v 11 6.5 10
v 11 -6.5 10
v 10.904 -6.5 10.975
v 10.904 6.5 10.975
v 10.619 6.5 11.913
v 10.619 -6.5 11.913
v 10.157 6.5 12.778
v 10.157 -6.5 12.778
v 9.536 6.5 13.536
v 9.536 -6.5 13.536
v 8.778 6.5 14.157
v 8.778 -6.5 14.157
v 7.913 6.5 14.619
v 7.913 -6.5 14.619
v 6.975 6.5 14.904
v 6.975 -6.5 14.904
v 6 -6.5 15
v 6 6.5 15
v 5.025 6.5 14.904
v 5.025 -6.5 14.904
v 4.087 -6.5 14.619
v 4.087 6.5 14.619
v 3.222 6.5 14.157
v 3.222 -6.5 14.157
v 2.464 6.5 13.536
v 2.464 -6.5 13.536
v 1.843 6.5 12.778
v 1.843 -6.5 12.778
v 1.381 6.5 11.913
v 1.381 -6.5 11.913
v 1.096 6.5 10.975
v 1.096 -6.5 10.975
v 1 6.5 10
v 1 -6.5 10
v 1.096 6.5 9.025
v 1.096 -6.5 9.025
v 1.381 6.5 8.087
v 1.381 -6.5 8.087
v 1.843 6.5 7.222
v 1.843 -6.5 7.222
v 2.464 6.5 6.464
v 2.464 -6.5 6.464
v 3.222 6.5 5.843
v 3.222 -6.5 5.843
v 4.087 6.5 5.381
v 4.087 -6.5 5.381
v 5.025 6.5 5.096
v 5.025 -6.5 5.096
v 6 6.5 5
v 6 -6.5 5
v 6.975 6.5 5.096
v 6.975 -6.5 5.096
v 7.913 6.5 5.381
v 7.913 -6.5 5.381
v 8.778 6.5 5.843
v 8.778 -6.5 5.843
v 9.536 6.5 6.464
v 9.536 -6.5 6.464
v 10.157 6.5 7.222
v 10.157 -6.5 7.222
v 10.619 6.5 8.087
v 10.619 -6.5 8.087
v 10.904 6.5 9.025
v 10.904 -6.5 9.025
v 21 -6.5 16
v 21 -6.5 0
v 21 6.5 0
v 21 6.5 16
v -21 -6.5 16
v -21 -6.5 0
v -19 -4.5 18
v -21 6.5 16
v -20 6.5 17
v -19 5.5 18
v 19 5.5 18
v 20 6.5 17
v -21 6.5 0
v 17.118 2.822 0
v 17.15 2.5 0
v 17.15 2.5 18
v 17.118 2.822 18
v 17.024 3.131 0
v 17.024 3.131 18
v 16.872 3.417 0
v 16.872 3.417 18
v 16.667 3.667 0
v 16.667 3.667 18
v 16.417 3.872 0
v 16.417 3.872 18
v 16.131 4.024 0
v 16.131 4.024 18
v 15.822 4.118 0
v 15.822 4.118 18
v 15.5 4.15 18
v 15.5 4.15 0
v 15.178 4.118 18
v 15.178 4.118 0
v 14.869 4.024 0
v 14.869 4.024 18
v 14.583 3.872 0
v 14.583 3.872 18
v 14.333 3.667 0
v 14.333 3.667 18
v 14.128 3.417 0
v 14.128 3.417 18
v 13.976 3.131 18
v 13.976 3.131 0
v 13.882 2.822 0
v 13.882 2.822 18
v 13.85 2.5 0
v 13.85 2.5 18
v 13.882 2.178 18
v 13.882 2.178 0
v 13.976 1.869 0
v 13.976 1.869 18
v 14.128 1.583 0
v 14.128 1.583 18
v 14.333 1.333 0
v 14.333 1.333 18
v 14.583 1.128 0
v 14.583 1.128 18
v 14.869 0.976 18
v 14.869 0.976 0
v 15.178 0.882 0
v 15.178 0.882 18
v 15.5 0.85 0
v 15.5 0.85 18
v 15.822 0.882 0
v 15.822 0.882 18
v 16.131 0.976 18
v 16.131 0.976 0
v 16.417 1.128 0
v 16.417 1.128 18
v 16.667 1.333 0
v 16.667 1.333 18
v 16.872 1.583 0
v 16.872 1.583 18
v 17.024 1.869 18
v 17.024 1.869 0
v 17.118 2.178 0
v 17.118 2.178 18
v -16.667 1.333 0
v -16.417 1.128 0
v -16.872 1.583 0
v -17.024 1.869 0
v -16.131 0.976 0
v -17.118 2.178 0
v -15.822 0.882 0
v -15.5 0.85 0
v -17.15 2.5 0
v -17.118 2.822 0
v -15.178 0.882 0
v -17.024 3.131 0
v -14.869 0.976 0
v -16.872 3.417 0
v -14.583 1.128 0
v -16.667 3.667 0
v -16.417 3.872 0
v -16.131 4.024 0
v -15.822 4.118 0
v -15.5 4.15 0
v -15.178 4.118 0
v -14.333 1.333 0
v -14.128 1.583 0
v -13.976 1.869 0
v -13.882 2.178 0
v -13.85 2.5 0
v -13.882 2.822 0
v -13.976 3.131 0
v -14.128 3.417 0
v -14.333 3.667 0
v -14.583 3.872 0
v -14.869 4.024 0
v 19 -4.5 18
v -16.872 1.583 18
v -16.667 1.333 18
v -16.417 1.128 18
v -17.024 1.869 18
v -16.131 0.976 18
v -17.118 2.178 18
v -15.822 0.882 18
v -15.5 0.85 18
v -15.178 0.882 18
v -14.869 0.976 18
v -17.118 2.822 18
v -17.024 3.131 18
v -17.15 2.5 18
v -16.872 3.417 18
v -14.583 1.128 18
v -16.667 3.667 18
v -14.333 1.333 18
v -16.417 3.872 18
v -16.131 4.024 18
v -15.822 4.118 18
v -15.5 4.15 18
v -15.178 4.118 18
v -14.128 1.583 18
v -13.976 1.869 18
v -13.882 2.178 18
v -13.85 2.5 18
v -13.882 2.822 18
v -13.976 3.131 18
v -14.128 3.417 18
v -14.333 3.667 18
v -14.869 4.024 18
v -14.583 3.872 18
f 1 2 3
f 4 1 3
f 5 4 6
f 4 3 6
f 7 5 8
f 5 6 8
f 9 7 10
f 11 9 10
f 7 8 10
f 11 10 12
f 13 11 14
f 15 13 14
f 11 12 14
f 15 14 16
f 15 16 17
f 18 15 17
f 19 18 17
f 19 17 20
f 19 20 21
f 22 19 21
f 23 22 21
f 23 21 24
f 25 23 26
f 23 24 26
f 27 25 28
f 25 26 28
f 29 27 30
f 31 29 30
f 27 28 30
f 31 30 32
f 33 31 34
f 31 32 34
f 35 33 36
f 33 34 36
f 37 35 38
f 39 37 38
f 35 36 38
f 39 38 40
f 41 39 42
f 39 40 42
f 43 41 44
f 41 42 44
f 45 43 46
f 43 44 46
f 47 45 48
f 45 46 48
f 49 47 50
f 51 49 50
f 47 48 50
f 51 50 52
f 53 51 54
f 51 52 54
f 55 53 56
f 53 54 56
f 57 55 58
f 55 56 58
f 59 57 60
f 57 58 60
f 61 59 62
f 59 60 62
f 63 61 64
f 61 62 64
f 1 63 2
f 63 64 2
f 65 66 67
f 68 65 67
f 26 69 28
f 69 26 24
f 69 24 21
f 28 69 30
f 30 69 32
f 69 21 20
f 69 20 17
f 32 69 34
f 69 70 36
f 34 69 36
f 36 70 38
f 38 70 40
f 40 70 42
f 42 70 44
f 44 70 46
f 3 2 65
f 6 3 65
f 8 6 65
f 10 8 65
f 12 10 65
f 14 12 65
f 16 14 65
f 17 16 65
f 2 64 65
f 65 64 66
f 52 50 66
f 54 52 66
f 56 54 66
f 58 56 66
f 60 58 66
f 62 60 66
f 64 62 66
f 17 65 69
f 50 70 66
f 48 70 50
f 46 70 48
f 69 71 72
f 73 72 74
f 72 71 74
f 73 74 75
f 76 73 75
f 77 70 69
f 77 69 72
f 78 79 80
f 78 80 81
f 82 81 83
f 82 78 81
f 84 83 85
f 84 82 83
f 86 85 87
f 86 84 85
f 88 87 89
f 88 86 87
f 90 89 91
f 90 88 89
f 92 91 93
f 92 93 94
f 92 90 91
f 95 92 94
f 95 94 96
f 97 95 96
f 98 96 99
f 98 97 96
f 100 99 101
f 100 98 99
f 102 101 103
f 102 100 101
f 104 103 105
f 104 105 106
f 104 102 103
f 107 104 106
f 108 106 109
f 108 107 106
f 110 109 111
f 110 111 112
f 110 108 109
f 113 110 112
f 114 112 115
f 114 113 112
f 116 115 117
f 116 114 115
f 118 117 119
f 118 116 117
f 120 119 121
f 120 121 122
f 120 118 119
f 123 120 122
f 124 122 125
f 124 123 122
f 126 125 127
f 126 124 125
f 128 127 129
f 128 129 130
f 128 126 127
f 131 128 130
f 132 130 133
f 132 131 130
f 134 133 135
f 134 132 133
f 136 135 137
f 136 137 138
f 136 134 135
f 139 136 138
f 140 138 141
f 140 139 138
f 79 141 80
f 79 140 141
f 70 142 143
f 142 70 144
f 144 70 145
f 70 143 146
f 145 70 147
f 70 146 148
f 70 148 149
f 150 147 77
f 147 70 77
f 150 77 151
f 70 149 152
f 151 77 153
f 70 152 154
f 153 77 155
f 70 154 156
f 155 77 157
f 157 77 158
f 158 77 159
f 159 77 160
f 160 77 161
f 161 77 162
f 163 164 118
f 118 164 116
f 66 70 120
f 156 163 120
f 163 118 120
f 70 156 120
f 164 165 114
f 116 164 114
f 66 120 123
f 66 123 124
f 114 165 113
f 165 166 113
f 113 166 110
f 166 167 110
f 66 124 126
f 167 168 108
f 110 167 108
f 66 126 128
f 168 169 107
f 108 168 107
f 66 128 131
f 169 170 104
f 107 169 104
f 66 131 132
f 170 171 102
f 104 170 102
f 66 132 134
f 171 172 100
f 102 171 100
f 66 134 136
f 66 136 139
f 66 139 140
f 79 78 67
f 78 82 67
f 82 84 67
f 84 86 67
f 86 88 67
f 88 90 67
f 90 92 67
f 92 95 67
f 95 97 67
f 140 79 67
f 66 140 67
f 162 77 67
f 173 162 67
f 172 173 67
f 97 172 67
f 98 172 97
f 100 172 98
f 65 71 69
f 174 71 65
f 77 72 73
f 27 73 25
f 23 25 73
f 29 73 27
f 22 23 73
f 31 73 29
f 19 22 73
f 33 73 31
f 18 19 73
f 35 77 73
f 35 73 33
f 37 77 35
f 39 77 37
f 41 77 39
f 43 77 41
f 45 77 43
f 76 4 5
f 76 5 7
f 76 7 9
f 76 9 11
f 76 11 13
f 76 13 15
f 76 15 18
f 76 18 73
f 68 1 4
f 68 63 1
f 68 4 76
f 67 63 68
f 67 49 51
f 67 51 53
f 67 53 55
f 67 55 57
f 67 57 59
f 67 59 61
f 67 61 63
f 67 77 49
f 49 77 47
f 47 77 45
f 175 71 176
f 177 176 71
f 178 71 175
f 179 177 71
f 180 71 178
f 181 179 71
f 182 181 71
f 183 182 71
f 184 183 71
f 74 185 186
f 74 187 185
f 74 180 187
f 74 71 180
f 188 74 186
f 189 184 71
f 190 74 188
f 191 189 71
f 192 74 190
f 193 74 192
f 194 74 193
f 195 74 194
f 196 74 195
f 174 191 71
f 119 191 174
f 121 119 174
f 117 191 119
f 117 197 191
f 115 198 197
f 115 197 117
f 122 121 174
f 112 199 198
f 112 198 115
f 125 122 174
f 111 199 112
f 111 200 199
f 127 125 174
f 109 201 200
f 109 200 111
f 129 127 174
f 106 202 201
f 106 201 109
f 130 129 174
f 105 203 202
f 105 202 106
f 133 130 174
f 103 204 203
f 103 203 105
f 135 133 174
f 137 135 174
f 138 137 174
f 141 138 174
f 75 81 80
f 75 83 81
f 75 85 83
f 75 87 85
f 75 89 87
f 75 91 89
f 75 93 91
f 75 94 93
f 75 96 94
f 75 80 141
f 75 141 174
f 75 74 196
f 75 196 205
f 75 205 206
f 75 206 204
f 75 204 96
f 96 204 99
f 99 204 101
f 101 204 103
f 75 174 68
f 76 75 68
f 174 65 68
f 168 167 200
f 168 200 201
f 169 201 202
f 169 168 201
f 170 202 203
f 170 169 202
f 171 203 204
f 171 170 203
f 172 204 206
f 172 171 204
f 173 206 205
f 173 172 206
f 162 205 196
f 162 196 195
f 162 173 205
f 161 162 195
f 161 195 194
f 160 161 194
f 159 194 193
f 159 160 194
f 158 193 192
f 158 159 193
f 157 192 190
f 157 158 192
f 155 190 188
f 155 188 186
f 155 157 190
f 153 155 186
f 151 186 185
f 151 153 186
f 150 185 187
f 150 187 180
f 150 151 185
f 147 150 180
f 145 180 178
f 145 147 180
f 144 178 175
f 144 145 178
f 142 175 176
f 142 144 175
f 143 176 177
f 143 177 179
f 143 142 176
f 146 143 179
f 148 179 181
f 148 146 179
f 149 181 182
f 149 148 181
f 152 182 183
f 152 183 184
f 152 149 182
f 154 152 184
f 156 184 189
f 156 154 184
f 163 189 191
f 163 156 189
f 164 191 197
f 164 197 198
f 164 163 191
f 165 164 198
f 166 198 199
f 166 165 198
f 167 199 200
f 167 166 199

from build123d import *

# Parameters (mm, degrees)
F0_W     = 42
F0_H     = 13
F0_R     = 1.65
F1_DEPTH = 18
F2_R     = 5
F3_DEPTH = 13
F4_SIZE  = 2
F5_SIZE  = 1


with BuildPart() as f1:
    # F0 (on Top) → F1 (new body)
    with BuildSketch(Plane.XY):
        Rectangle(F0_W, F0_H)
        with Locations((-15.5, 2.5)):
            Circle(F0_R, mode=Mode.SUBTRACT)
        with Locations((15.5, 2.5)):
            Circle(F0_R, mode=Mode.SUBTRACT)
    extrude(amount=F1_DEPTH)

    # F2 (on face) → F3 (cut, through all)
    with BuildSketch(Plane.XZ.offset(6.5)):
        with Locations((6, 10)):
            Circle(F2_R)
    extrude(amount=-F3_DEPTH, mode=Mode.SUBTRACT)

    # F4
    f4_edges = [f1.edges().sort_by_distance(p)[0] for p in [
        (-21, 0, 18),
        (0, -6.5, 18),
        (21, 0, 18),
    ]]
    chamfer(f4_edges, length=F4_SIZE)

    # F5
    f5_edges = [f1.edges().sort_by_distance(p)[0] for p in [
        (0, 6.5, 18),
    ]]
    chamfer(f5_edges, length=F5_SIZE)


solid = f1.part
